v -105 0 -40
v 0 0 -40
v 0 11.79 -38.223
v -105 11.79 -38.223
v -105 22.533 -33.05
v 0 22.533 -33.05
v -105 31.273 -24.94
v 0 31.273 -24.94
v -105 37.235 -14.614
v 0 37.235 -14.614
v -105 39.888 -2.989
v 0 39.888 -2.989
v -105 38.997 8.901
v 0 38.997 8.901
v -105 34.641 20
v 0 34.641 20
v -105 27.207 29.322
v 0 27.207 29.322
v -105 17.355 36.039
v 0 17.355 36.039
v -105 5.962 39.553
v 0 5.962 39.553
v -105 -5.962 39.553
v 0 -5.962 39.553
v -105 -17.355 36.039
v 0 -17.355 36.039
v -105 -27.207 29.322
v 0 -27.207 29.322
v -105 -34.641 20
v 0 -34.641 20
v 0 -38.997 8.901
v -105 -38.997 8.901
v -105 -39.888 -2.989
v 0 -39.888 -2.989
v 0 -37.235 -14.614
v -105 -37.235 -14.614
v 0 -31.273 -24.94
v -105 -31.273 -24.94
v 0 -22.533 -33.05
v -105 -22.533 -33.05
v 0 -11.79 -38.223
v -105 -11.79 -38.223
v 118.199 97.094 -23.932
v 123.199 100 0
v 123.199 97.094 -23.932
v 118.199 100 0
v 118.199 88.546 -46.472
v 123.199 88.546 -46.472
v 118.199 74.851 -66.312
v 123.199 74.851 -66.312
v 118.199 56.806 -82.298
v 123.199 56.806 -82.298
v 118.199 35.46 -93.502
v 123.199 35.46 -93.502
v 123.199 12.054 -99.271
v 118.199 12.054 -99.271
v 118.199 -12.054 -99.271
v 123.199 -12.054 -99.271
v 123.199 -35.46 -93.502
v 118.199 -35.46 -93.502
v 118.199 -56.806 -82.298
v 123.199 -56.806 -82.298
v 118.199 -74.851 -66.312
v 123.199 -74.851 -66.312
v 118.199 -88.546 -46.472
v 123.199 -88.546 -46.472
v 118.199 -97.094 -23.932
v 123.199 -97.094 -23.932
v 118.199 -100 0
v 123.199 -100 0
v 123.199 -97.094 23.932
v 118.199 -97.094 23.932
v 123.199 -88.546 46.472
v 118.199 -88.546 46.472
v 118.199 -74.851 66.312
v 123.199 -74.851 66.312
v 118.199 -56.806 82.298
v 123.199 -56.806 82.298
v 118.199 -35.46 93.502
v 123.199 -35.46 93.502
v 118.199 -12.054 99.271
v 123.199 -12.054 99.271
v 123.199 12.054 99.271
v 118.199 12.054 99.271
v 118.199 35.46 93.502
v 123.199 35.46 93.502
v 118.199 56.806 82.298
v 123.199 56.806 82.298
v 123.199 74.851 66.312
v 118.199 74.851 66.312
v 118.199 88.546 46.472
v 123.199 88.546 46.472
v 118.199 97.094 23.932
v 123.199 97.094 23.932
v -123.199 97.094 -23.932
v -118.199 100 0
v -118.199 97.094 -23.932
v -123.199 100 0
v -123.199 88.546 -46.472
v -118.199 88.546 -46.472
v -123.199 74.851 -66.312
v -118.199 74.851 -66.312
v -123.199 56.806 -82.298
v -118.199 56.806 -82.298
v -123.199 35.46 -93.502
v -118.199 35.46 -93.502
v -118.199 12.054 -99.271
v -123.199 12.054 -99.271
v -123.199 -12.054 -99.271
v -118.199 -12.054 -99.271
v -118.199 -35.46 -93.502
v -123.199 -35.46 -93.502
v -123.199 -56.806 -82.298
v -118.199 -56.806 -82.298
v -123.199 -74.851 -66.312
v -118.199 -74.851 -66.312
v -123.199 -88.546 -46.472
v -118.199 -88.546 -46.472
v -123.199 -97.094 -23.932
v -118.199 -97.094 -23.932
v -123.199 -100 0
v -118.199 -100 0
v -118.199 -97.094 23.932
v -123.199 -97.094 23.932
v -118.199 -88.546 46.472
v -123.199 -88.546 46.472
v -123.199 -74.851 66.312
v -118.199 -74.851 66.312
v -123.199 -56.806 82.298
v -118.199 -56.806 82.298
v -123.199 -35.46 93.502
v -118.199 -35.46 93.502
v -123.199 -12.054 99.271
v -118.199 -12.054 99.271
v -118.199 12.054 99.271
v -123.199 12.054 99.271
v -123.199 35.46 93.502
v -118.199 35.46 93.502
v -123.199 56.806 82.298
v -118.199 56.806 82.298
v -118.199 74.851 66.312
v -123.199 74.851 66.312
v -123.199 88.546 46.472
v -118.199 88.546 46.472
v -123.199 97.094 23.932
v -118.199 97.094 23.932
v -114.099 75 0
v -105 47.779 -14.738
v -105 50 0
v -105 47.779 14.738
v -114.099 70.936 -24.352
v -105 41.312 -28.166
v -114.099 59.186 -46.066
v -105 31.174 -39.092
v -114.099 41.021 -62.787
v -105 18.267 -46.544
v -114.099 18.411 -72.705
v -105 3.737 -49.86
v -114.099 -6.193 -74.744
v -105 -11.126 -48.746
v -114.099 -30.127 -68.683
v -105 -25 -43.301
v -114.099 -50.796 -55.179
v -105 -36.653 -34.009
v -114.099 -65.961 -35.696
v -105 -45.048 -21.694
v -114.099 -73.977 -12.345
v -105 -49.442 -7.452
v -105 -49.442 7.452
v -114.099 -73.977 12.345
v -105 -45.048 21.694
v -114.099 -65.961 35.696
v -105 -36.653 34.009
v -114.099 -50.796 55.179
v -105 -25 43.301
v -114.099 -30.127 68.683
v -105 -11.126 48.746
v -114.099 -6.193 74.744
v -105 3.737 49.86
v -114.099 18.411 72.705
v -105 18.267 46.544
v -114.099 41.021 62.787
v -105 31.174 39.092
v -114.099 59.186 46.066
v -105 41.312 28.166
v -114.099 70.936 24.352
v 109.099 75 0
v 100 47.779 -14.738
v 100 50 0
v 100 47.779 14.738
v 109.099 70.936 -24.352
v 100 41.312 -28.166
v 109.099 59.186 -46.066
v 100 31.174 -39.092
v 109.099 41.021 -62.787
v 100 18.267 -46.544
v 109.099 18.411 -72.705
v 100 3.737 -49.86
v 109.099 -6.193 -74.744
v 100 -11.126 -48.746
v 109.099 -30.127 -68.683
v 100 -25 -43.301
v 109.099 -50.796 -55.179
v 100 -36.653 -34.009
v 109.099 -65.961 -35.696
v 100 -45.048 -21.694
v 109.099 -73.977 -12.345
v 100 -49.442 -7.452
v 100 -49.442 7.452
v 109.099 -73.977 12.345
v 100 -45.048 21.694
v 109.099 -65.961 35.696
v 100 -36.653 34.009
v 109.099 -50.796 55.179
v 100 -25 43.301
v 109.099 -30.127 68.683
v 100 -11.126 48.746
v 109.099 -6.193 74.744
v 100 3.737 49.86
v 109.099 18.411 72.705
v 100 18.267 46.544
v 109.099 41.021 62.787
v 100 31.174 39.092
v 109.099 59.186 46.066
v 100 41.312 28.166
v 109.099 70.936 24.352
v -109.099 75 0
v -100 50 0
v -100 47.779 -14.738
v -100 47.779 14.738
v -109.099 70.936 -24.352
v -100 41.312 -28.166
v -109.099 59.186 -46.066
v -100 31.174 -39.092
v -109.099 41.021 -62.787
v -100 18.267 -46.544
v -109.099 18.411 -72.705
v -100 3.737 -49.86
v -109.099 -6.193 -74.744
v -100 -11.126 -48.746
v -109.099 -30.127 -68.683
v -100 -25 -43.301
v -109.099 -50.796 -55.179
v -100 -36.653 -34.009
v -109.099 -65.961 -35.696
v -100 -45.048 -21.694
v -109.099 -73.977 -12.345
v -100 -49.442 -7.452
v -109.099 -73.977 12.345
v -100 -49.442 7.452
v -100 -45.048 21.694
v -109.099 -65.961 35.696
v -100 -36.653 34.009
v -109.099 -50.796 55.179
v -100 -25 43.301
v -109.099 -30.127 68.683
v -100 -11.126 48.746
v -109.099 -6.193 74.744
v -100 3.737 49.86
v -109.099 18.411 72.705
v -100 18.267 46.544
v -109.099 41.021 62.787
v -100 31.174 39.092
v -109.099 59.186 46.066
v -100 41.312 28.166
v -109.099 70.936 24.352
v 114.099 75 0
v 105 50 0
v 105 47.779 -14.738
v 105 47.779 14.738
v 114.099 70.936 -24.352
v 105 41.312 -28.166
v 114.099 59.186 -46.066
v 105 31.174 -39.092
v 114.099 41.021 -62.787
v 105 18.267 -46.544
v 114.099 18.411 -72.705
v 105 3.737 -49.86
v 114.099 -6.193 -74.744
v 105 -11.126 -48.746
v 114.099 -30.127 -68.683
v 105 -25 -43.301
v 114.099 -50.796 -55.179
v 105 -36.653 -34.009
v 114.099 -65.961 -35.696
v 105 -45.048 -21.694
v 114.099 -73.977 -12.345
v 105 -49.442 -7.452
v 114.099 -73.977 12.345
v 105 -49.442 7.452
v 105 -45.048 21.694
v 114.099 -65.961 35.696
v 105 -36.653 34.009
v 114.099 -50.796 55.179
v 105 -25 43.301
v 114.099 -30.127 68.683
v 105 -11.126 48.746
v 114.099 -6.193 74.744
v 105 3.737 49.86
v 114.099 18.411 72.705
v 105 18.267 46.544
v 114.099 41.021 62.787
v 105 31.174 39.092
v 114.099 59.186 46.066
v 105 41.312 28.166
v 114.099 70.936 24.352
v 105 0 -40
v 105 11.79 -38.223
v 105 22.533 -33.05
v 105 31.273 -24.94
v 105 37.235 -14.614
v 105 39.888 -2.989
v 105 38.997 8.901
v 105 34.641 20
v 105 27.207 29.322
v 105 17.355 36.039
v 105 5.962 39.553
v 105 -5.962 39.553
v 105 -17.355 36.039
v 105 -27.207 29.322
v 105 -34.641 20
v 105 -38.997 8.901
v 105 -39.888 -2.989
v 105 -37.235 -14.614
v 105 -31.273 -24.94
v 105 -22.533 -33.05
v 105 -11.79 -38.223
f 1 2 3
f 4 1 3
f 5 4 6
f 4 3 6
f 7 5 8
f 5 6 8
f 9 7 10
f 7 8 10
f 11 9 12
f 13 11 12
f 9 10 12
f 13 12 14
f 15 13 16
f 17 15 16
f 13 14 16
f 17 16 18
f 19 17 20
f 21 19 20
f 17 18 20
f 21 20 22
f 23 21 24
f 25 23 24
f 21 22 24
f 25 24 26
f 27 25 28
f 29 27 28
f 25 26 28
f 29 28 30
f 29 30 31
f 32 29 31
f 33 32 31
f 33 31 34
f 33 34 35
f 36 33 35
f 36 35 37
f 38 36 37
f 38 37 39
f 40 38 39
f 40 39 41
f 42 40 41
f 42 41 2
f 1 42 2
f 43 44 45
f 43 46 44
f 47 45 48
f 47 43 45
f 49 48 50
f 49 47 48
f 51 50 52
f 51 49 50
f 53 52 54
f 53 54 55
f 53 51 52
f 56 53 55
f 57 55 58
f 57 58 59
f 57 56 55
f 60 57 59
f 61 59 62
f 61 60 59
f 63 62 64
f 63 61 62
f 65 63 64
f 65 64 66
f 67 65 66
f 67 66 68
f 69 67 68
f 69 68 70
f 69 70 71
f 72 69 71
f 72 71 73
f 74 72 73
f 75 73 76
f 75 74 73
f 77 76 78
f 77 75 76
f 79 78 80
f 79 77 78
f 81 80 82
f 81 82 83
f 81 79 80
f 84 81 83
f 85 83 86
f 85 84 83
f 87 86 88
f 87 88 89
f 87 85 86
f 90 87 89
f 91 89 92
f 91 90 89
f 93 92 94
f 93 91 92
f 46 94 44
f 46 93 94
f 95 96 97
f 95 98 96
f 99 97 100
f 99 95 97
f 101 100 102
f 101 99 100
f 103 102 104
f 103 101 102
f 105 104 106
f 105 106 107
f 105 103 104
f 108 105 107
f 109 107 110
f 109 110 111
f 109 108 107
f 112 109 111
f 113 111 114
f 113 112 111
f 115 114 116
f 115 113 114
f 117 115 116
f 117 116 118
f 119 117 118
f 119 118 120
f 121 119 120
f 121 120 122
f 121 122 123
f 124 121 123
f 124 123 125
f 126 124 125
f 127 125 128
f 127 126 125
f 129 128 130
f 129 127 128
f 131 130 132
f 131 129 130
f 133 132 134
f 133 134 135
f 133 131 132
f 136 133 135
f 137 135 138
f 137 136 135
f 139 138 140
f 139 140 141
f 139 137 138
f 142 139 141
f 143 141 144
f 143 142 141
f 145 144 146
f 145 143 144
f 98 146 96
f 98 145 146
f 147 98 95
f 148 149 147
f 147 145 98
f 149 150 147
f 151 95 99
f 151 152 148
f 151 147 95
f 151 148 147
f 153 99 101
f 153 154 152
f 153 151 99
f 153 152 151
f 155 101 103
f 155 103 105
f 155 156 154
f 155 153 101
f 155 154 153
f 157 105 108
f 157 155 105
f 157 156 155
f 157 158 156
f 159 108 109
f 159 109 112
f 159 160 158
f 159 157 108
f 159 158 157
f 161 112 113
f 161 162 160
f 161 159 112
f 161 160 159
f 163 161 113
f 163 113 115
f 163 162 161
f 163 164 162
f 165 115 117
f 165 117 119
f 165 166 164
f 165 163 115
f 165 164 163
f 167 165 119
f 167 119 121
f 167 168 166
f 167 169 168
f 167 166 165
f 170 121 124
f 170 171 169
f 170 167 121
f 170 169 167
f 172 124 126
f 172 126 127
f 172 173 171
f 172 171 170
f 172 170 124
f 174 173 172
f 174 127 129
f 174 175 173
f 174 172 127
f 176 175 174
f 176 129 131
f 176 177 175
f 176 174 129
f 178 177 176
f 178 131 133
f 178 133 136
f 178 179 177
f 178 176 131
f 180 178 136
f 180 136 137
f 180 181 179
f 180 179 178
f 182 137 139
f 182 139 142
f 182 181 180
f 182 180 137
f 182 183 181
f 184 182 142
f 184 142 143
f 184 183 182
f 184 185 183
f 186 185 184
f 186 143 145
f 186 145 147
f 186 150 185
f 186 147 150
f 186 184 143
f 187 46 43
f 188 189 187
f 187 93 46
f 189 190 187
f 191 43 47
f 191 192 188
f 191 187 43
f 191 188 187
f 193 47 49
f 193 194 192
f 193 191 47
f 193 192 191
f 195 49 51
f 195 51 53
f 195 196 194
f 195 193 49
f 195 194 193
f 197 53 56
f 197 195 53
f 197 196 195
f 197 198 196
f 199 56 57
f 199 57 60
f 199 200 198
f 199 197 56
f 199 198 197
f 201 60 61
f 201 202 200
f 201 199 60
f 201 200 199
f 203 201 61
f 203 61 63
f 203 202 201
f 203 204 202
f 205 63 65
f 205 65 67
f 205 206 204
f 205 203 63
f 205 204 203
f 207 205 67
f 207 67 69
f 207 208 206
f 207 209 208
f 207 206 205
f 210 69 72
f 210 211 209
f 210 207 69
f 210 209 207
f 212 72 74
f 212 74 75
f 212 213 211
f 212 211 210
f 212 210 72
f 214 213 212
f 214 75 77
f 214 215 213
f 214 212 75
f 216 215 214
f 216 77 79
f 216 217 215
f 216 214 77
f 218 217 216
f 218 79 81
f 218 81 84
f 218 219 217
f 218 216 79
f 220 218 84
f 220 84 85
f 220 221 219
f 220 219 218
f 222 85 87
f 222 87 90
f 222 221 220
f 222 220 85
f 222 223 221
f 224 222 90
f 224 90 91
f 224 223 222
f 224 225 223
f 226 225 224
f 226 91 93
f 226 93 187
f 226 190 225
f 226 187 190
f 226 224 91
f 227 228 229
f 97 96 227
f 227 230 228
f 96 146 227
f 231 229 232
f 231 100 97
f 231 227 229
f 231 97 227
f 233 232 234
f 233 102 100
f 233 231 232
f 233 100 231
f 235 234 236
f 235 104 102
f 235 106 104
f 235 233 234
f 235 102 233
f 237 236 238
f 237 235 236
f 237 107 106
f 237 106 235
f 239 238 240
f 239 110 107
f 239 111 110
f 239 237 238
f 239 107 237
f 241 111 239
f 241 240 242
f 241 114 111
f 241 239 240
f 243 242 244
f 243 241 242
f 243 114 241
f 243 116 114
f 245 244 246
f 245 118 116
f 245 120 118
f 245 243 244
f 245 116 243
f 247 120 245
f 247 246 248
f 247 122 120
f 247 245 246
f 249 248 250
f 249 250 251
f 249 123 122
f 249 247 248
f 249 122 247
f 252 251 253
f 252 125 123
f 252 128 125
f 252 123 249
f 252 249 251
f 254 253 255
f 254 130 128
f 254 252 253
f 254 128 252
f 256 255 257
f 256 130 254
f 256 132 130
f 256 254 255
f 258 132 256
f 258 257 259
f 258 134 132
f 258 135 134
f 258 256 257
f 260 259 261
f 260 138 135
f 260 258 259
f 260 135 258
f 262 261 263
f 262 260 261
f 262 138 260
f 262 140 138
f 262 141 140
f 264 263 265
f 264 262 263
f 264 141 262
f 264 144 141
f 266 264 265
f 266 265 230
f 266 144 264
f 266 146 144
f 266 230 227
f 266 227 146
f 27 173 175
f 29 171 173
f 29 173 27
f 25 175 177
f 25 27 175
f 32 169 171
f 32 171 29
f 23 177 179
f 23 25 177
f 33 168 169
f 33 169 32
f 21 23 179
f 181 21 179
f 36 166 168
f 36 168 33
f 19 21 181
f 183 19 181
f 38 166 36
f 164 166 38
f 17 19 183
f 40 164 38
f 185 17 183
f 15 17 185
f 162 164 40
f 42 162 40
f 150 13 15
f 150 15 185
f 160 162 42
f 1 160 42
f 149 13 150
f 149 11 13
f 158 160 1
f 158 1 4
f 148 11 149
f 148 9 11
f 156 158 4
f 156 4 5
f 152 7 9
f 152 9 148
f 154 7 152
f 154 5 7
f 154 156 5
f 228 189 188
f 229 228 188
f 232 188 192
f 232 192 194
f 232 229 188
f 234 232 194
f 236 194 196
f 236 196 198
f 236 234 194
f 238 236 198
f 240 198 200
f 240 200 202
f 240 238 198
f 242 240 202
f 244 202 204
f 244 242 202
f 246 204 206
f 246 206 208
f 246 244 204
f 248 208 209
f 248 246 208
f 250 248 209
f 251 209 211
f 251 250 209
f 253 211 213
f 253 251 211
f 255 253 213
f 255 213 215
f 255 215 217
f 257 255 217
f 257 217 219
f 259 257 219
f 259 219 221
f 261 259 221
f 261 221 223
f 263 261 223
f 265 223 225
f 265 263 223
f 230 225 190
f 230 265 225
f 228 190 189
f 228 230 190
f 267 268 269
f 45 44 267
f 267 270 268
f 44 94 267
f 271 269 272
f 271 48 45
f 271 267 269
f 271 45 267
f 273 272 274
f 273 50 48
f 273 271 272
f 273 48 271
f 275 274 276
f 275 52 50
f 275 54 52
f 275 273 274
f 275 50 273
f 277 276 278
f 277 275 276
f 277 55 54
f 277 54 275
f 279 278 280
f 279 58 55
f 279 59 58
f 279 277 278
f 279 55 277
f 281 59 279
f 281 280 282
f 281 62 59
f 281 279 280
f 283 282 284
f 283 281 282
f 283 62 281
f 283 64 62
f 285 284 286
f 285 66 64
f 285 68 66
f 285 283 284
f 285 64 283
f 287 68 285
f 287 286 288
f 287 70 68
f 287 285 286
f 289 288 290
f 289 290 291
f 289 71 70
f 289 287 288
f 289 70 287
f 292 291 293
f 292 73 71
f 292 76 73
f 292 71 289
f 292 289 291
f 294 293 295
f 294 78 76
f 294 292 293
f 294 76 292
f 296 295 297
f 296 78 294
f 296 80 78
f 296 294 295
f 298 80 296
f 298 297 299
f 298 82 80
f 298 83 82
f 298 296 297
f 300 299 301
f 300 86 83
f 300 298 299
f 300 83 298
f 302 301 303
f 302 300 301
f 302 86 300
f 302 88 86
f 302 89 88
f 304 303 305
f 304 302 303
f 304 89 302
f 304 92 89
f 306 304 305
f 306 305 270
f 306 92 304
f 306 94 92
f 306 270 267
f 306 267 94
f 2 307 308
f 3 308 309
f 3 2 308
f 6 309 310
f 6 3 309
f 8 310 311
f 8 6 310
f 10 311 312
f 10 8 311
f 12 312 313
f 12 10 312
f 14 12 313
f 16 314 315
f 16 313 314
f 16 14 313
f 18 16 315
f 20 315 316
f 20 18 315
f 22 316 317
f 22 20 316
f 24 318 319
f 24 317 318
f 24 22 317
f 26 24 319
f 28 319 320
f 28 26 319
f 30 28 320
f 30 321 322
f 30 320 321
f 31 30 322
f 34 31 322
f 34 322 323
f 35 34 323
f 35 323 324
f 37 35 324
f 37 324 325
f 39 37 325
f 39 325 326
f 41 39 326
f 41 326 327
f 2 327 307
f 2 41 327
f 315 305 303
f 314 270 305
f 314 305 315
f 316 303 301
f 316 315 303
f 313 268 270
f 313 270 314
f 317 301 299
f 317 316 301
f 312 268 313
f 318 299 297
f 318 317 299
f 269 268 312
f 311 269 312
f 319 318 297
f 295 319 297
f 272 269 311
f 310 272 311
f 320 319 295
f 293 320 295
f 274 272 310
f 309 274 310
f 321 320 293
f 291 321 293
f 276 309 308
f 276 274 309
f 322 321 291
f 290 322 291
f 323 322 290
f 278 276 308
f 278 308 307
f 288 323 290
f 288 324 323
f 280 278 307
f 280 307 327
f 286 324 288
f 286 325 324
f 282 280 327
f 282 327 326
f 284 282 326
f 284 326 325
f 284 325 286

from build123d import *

# Parameters (mm, degrees)
SKETCH4_R               = 40
CUT_EXTRUDE2_DEPTH      = 124.198511713
CUT_EXTRUDE2_DEPTH_BACK = 124.198511713


with BuildPart() as part:
    # Sketch3 → Revolve1 (revolve)
    with BuildSketch(Plane.XY):
        Polygon((100, 50), (-100, 50), (-118.198511713, 100), (-123.198511713, 100), (-105, 50), (-105, 0), (105, 0), (105, 50), (123.198511713, 100), (118.198511713, 100), align=None)
    revolve(axis=Axis((160.387463579, 0, 0), (-1, 0, 0)))

    # Sketch4 → Cut-Extrude2 (cut, two sides)
    with BuildSketch(Plane(origin=(0, 0, 0), x_dir=(0, 0, -1), z_dir=(1, 0, 0))) as cut_extrude2_sk:
        Circle(SKETCH4_R)
    extrude(amount=CUT_EXTRUDE2_DEPTH, mode=Mode.SUBTRACT)
    extrude(cut_extrude2_sk.sketch, amount=-CUT_EXTRUDE2_DEPTH_BACK, mode=Mode.SUBTRACT)


solid = part.part
